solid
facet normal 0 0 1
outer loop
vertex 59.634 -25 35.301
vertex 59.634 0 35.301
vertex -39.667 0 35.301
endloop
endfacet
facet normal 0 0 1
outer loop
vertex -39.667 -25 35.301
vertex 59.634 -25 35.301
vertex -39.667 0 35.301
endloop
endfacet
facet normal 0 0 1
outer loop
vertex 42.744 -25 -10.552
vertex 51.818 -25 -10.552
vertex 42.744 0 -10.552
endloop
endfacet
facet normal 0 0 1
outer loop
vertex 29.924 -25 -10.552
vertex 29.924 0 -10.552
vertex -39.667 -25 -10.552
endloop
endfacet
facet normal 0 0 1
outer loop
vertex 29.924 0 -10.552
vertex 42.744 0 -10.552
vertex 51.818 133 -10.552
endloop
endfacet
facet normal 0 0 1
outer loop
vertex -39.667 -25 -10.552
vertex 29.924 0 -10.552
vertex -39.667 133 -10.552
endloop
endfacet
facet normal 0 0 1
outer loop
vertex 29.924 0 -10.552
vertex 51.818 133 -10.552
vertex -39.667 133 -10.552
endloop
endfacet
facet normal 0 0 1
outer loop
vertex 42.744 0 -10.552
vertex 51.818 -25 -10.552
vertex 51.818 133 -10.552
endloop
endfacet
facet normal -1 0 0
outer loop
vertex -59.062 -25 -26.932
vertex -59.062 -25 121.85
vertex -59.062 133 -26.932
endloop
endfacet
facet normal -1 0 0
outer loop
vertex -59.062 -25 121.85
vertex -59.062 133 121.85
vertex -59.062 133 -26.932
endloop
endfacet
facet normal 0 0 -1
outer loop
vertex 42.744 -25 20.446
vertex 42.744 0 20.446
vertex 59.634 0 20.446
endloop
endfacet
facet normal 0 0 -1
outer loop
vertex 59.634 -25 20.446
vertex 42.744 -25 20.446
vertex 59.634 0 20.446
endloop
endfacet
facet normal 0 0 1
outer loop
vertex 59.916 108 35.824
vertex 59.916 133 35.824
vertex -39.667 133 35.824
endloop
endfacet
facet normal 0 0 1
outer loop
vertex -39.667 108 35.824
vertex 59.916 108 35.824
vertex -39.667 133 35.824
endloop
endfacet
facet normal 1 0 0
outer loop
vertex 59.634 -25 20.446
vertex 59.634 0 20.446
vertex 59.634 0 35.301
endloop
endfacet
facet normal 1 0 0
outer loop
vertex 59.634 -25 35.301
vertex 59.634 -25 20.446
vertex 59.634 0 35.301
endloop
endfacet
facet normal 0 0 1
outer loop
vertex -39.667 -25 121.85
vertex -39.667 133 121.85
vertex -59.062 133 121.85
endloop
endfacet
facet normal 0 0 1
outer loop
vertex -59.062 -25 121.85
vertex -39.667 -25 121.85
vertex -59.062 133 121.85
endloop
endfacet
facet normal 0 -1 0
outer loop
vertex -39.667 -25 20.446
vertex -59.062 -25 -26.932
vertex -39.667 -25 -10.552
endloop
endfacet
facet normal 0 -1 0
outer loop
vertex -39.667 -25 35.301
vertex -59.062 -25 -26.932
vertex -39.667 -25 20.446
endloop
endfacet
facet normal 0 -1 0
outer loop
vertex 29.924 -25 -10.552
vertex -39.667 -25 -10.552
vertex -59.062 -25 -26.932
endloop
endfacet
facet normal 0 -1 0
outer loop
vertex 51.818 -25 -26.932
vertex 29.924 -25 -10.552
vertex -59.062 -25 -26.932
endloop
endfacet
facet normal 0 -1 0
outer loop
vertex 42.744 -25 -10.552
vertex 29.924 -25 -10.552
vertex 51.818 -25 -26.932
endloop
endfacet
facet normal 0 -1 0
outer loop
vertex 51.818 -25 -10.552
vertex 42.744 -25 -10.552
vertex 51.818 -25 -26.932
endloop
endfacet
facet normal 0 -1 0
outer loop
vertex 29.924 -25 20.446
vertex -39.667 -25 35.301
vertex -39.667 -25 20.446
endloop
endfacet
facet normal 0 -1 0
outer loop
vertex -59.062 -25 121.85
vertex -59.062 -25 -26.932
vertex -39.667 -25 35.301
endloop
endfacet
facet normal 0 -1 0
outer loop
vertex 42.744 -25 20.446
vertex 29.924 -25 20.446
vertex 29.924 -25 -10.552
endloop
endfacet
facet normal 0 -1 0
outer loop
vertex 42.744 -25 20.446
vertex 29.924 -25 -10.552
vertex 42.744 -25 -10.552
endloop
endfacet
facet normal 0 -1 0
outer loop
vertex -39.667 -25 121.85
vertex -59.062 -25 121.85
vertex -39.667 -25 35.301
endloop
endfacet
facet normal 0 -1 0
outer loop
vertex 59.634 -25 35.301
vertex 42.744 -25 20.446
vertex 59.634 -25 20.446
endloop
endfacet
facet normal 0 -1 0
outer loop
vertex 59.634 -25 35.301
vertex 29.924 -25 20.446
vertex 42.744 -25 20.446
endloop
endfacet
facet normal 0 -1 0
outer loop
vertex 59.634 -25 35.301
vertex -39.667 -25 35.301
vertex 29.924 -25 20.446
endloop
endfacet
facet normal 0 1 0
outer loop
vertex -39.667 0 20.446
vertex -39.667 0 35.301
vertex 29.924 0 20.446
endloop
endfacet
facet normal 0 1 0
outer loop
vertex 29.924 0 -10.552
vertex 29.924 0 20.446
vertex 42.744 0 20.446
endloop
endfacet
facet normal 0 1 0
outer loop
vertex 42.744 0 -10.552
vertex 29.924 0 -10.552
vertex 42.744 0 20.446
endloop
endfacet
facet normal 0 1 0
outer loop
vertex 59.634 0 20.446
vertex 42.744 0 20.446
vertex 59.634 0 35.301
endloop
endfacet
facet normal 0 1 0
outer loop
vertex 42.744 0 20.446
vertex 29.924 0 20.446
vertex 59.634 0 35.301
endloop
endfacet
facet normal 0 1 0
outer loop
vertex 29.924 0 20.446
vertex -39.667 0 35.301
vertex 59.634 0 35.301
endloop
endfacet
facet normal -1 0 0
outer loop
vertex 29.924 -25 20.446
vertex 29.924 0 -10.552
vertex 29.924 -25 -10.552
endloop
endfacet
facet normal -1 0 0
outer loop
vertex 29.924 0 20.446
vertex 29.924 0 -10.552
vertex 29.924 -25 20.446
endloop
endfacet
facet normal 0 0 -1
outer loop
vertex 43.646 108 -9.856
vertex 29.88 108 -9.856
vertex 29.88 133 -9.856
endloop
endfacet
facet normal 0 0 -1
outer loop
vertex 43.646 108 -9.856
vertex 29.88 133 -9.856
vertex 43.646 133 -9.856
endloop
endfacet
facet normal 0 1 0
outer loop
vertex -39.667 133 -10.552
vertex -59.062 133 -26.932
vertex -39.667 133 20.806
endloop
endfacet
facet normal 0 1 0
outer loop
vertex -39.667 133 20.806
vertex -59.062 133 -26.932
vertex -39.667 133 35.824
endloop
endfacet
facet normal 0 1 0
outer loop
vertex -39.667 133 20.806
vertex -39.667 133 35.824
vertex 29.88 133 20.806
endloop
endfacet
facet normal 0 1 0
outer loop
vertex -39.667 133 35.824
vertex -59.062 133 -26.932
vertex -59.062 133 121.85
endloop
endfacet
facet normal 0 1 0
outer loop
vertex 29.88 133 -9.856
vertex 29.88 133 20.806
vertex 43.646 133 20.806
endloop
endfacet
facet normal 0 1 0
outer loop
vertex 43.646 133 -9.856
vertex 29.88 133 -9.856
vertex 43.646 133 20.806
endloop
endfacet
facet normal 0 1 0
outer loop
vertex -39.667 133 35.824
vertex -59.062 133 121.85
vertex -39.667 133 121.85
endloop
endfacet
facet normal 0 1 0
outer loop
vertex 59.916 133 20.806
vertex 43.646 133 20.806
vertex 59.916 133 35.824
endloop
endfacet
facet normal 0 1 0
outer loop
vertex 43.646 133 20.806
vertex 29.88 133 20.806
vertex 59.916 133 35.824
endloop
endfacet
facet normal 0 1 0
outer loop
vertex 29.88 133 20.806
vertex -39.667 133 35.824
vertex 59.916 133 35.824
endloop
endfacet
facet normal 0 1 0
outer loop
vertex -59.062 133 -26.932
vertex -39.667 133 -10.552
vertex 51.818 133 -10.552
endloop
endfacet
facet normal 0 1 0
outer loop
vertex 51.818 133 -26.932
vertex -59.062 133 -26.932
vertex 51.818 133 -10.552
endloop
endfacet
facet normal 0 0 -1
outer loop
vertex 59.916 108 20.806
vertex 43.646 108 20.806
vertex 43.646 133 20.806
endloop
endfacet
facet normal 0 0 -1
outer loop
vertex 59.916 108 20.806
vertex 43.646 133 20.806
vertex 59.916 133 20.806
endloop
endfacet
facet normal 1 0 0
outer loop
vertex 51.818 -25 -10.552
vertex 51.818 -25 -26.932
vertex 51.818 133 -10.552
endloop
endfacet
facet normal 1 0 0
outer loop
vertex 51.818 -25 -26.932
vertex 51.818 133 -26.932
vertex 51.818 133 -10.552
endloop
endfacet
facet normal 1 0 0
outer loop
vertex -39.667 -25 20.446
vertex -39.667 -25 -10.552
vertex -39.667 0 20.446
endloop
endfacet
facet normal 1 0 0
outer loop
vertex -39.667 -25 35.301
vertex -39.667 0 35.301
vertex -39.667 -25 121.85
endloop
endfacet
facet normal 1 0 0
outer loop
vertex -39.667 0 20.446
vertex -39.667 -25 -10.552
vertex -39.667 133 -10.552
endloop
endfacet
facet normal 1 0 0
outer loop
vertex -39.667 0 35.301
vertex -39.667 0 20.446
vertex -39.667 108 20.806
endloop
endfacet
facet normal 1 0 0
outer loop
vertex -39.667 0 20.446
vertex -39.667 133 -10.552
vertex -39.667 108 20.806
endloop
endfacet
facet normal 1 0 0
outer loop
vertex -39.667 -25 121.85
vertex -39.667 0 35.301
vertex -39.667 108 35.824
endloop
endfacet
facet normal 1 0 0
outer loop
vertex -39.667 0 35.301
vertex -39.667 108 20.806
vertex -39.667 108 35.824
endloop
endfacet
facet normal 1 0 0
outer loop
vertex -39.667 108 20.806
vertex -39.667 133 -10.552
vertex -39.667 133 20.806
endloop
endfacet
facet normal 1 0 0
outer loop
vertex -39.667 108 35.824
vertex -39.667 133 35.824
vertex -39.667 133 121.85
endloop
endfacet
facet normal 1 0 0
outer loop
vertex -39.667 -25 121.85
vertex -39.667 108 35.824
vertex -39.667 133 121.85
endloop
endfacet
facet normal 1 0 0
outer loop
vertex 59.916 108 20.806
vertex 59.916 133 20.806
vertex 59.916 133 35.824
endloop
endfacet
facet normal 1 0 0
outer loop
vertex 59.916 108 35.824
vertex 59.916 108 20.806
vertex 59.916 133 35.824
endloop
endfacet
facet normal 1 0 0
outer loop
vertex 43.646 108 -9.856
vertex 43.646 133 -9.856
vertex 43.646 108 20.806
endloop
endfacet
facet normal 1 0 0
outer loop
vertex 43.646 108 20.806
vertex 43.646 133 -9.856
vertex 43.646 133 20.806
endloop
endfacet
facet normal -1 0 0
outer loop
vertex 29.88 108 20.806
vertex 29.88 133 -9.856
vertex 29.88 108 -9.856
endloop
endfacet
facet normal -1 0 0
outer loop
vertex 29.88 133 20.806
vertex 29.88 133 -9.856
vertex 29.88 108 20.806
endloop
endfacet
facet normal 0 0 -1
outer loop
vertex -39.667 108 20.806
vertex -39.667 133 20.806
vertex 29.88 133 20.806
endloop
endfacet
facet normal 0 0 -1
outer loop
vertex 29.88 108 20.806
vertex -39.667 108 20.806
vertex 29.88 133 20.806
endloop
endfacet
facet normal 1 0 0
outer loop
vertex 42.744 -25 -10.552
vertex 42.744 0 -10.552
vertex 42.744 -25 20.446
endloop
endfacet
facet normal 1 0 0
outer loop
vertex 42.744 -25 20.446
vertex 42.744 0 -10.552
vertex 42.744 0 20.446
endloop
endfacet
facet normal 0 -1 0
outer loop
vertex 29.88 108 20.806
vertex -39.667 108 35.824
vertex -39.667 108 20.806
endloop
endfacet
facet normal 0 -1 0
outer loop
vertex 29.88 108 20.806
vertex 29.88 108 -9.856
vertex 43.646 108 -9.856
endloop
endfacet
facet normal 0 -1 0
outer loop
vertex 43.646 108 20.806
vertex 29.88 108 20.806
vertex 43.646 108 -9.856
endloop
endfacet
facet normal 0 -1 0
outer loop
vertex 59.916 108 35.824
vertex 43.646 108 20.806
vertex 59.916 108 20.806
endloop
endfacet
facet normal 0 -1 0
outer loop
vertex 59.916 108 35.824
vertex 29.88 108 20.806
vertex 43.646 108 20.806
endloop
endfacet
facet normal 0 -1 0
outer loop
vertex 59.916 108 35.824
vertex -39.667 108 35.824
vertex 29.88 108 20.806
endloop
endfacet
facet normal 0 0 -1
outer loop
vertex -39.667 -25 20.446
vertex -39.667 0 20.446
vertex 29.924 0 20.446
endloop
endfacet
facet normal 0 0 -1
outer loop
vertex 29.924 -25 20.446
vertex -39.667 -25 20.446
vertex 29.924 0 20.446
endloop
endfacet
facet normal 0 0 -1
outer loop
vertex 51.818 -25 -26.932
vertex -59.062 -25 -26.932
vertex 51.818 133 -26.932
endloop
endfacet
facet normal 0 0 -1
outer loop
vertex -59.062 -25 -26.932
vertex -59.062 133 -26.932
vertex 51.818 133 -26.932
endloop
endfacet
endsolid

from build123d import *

# Parameters (mm, degrees)
F1_DEPTH = 133
F0_W     = 12.819961
F0_H     = 30.998608
F2_DEPTH = 25
F4_W     = 13.766533
F4_H     = 30.66182
F5_DEPTH = 25


with BuildPart() as f1:
    # F0 (on Front) → F1 (new body)
    with BuildSketch(Plane.XZ):
        Polygon((29.924046, -10.552499), (-39.667495, -10.552499), (-39.667495, 20.446109), (-39.667495, 35.30141), (-39.667495, 121.849649), (-59.0625, 121.849649), (-59.0625, -10.552499), (-59.0625, -26.9325), (51.817503, -26.9325), (51.817503, -10.552499), (42.744007, -10.552499), align=None)
    extrude(amount=-F1_DEPTH)

    # F0 (on Front) → F2 (join)
    with BuildSketch(Plane.XZ):
        Polygon((29.924046, -10.552499), (-39.667495, -10.552499), (-39.667495, 20.446109), (-39.667495, 35.30141), (-39.667495, 121.849649), (-59.0625, 121.849649), (-59.0625, -10.552499), (-59.0625, -26.9325), (51.817503, -26.9325), (51.817503, -10.552499), (42.744007, -10.552499), align=None)
        with Locations((36.334026, 4.946805)):
            Rectangle(F0_W, F0_H)
        Polygon((-39.667495, 35.30141), (-39.667495, 20.446109), (29.924046, 20.446109), (42.744007, 20.446109), (59.634183, 20.446109), (59.634183, 35.30141), align=None)
    extrude(amount=F2_DEPTH)

    # F4 (on offset) → F5 (join)
    with BuildSketch(Plane.XZ.offset(-133)):
        Polygon((59.915699, 20.806234), (59.915699, 35.824269), (-42.081788, 35.824269), (-42.081788, 20.806234), (29.879631, 20.806234), (43.646164, 20.806234), align=None)
        with Locations((36.762898, 5.475324)):
            Rectangle(F4_W, F4_H)
    extrude(amount=F5_DEPTH)


solid = f1.part
